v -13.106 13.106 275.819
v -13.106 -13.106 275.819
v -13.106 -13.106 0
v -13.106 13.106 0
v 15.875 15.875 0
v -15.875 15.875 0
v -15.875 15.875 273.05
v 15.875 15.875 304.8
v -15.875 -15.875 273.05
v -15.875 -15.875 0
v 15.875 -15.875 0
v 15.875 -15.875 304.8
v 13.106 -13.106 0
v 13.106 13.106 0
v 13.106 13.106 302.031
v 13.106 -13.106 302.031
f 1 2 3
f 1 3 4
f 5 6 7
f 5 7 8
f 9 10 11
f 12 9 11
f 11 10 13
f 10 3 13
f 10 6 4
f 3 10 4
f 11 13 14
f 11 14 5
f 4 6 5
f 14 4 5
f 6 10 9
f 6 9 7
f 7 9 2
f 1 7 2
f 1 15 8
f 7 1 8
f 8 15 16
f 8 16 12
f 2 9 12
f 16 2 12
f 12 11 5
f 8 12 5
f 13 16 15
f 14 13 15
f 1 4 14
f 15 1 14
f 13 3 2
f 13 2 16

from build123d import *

# Parameters (mm, degrees)
SKETCH_W     = 31.75
SKETCH_H     = 31.75
SKETCH_W_2   = 26.2128
SKETCH_H_2   = 26.2128
PAD_DEPTH    = 304.8
POCKET_DEPTH = 31.75


with BuildPart() as part:
    # Sketch → Pad (new body)
    with BuildSketch(Plane.XY):
        Rectangle(SKETCH_W, SKETCH_H)
        Rectangle(SKETCH_W_2, SKETCH_H_2, mode=Mode.SUBTRACT)
    extrude(amount=PAD_DEPTH)

    # Sketch001 → Pocket (cut)
    with BuildSketch(Plane.XZ.offset(15.875)):
        Polygon((15.875, 304.8), (-15.875, 304.8), (-15.875, 273.05), align=None)
    extrude(amount=-POCKET_DEPTH, mode=Mode.SUBTRACT)


solid = part.part
